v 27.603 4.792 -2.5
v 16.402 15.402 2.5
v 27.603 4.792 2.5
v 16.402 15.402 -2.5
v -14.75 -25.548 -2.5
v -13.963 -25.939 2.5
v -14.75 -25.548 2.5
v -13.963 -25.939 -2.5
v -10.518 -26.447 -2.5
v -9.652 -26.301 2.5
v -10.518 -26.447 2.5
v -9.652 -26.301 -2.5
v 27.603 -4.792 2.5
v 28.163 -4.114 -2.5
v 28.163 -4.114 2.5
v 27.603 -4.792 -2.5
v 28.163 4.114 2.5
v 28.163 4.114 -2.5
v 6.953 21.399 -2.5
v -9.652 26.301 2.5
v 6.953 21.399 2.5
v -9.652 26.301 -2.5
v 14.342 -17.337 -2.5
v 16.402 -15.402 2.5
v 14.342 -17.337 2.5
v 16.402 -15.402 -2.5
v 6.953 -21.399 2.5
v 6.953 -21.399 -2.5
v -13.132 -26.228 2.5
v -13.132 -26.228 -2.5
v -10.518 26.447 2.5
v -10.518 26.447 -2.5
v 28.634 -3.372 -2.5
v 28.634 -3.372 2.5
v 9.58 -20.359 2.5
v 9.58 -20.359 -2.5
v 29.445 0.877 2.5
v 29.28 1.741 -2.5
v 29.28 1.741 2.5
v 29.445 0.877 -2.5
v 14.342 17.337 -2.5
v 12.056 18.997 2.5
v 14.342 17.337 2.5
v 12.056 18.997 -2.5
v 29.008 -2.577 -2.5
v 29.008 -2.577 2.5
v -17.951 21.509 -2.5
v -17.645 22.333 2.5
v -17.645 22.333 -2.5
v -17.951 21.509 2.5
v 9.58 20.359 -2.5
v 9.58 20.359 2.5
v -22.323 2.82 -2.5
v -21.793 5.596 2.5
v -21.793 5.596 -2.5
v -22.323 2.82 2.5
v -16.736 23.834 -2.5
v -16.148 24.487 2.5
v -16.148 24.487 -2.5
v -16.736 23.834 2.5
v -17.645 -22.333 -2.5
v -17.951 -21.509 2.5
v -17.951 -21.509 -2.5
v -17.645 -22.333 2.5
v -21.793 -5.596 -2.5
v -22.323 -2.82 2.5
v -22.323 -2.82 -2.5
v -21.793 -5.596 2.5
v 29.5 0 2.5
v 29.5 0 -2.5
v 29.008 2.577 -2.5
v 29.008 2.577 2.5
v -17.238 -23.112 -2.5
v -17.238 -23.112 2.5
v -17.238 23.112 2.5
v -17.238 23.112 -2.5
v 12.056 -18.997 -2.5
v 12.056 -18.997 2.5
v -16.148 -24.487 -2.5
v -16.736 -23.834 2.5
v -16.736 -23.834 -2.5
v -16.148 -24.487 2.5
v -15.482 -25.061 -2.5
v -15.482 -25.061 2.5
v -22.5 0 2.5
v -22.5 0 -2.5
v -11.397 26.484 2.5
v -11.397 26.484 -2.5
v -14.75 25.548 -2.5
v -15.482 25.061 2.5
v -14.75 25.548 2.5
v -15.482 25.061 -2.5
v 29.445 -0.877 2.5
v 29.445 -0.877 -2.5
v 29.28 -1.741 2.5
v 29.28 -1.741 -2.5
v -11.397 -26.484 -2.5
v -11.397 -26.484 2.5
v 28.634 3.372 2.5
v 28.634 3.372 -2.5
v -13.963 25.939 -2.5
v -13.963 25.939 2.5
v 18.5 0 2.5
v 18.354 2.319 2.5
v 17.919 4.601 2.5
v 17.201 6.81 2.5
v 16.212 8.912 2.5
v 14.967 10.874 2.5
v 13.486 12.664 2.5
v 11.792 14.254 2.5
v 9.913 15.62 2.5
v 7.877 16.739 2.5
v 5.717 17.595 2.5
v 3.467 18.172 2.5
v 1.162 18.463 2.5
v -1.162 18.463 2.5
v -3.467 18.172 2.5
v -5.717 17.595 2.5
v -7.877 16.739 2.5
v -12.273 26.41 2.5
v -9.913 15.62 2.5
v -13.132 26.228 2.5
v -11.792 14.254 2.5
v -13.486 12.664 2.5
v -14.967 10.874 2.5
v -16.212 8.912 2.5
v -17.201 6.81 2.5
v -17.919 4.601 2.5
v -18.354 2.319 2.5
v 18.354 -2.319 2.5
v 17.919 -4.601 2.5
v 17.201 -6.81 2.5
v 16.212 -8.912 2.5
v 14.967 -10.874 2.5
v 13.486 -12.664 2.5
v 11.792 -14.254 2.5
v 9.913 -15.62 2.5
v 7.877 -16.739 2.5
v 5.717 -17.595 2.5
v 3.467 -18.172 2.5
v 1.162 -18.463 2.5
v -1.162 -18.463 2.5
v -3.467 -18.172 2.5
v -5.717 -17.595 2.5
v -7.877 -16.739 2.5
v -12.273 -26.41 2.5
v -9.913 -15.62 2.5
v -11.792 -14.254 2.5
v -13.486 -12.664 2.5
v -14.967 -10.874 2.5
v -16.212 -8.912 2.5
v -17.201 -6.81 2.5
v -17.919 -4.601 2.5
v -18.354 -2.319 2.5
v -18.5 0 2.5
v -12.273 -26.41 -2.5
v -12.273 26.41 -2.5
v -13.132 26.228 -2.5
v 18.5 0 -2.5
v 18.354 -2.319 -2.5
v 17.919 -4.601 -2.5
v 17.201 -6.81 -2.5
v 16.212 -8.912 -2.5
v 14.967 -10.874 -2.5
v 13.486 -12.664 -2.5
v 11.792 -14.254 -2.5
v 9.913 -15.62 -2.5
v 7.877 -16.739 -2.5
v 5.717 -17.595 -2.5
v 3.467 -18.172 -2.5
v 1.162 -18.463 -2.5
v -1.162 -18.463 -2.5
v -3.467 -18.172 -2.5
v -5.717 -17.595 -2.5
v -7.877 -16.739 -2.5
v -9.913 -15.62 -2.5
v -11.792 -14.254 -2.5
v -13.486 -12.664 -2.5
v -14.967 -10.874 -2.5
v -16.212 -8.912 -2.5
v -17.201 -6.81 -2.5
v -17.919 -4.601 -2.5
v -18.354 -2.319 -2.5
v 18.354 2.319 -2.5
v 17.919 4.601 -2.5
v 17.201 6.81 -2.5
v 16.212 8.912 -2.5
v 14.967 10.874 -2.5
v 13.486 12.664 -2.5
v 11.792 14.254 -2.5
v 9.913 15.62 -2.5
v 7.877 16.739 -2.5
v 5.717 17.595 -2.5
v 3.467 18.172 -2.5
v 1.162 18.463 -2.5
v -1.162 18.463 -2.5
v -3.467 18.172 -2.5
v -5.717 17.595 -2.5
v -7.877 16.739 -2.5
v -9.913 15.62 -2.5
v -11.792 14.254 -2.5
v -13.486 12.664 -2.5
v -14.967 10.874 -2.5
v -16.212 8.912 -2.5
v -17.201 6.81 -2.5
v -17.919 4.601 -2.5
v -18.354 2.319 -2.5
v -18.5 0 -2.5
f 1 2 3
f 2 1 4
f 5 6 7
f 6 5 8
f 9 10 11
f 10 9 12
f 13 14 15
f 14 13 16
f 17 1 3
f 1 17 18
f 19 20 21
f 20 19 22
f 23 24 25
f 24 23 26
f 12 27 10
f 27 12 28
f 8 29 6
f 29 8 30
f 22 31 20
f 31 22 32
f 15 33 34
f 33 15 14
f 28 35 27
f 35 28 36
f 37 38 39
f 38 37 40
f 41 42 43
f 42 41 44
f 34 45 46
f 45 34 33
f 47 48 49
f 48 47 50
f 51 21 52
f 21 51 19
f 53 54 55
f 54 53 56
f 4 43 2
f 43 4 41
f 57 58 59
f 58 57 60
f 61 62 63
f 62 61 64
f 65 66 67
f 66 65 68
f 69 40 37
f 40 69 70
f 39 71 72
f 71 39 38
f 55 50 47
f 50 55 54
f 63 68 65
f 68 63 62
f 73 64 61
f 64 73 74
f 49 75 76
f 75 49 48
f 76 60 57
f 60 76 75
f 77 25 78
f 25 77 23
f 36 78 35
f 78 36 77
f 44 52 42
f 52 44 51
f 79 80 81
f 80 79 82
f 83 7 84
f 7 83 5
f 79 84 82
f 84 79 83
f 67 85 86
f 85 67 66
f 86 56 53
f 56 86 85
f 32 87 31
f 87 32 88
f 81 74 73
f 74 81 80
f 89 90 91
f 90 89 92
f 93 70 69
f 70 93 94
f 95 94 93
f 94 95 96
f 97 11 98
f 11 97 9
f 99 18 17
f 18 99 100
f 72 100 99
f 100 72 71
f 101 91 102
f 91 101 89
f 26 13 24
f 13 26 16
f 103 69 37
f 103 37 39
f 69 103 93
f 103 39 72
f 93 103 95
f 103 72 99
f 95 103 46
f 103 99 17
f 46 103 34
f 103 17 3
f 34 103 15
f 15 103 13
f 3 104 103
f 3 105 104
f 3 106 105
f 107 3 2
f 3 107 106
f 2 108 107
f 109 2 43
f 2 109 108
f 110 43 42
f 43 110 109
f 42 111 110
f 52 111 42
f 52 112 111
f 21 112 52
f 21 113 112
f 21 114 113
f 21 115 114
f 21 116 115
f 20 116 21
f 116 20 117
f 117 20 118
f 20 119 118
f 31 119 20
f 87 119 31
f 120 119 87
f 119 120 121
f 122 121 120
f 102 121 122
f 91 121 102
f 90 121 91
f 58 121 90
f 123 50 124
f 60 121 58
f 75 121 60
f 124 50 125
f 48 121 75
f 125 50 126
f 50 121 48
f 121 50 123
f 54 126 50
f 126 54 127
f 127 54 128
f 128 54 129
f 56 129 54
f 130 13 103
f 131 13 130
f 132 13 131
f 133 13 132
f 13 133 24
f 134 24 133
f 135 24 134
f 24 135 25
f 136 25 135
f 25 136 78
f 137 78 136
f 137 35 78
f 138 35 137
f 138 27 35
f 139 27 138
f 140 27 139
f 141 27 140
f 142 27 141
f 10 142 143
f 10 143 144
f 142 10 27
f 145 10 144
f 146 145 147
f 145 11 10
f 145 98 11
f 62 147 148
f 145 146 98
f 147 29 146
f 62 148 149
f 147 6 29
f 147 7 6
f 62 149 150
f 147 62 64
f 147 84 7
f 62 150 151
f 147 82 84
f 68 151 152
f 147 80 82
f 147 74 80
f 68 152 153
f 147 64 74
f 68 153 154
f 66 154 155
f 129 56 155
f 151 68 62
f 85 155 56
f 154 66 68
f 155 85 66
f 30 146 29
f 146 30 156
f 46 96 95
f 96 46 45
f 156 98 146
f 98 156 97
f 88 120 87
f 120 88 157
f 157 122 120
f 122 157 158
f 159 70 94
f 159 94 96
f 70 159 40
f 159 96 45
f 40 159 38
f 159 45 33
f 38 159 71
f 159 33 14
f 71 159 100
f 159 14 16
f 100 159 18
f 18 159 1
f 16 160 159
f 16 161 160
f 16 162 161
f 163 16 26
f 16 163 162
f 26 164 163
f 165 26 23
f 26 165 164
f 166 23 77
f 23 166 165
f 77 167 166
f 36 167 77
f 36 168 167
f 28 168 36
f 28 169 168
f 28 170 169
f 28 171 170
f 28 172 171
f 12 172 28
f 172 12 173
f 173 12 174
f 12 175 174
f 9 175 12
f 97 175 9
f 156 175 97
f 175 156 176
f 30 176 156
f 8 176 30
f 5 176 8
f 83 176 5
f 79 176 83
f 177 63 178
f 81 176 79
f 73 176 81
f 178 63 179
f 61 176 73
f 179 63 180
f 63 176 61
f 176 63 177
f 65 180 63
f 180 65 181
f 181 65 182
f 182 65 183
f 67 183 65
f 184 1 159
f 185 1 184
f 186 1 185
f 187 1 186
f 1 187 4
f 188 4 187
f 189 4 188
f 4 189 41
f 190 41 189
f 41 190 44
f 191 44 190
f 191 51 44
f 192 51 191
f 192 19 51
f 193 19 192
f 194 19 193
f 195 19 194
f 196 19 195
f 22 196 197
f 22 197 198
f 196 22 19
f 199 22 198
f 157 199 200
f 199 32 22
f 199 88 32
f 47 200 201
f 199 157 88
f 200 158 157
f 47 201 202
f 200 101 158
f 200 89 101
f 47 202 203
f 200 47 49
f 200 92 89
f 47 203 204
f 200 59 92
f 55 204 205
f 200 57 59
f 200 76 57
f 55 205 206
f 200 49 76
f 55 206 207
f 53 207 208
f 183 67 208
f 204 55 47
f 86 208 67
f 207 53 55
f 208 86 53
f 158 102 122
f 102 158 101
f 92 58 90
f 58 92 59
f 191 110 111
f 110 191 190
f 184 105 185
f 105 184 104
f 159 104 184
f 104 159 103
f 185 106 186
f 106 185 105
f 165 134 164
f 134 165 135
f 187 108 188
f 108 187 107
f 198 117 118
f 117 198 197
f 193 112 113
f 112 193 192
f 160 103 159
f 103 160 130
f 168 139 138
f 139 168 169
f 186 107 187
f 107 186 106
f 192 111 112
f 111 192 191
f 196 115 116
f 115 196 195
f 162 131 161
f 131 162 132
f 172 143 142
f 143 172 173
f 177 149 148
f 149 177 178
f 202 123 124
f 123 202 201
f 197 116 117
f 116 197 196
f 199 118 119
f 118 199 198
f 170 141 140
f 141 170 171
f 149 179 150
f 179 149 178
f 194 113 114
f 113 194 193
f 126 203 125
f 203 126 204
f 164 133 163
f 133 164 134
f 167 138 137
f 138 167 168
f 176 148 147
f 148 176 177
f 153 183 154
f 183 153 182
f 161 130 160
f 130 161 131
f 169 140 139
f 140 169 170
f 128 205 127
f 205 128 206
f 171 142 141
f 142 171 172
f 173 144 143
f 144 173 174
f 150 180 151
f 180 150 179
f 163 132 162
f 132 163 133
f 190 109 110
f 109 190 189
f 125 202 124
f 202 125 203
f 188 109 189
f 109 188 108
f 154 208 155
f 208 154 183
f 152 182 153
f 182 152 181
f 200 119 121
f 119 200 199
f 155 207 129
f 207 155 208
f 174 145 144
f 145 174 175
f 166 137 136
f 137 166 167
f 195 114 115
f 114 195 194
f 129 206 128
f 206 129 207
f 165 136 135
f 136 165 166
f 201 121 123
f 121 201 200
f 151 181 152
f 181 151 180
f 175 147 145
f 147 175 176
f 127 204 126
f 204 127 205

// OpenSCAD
//height
a=5;
//internal radius of holder
b=37/2;
//radius of grabbers
c=7;
//thickness
t=4;

difference(){
hull(){
cylinder(h=a, r=b+t, center=true, $fn=50);
translate([b+t,0,0])cylinder(h=a, r=c, center=true, $fn=50);
rotate([0,0,120])translate([b+t,0,0])cylinder(h=a, r=c, center=true, $fn=50);
rotate([0,0,240])translate([b+t,0,0])cylinder(h=a, r=c, center=true, $fn=50);
}
cylinder(h=a+1, r=b, center=true, $fn=50);
}
